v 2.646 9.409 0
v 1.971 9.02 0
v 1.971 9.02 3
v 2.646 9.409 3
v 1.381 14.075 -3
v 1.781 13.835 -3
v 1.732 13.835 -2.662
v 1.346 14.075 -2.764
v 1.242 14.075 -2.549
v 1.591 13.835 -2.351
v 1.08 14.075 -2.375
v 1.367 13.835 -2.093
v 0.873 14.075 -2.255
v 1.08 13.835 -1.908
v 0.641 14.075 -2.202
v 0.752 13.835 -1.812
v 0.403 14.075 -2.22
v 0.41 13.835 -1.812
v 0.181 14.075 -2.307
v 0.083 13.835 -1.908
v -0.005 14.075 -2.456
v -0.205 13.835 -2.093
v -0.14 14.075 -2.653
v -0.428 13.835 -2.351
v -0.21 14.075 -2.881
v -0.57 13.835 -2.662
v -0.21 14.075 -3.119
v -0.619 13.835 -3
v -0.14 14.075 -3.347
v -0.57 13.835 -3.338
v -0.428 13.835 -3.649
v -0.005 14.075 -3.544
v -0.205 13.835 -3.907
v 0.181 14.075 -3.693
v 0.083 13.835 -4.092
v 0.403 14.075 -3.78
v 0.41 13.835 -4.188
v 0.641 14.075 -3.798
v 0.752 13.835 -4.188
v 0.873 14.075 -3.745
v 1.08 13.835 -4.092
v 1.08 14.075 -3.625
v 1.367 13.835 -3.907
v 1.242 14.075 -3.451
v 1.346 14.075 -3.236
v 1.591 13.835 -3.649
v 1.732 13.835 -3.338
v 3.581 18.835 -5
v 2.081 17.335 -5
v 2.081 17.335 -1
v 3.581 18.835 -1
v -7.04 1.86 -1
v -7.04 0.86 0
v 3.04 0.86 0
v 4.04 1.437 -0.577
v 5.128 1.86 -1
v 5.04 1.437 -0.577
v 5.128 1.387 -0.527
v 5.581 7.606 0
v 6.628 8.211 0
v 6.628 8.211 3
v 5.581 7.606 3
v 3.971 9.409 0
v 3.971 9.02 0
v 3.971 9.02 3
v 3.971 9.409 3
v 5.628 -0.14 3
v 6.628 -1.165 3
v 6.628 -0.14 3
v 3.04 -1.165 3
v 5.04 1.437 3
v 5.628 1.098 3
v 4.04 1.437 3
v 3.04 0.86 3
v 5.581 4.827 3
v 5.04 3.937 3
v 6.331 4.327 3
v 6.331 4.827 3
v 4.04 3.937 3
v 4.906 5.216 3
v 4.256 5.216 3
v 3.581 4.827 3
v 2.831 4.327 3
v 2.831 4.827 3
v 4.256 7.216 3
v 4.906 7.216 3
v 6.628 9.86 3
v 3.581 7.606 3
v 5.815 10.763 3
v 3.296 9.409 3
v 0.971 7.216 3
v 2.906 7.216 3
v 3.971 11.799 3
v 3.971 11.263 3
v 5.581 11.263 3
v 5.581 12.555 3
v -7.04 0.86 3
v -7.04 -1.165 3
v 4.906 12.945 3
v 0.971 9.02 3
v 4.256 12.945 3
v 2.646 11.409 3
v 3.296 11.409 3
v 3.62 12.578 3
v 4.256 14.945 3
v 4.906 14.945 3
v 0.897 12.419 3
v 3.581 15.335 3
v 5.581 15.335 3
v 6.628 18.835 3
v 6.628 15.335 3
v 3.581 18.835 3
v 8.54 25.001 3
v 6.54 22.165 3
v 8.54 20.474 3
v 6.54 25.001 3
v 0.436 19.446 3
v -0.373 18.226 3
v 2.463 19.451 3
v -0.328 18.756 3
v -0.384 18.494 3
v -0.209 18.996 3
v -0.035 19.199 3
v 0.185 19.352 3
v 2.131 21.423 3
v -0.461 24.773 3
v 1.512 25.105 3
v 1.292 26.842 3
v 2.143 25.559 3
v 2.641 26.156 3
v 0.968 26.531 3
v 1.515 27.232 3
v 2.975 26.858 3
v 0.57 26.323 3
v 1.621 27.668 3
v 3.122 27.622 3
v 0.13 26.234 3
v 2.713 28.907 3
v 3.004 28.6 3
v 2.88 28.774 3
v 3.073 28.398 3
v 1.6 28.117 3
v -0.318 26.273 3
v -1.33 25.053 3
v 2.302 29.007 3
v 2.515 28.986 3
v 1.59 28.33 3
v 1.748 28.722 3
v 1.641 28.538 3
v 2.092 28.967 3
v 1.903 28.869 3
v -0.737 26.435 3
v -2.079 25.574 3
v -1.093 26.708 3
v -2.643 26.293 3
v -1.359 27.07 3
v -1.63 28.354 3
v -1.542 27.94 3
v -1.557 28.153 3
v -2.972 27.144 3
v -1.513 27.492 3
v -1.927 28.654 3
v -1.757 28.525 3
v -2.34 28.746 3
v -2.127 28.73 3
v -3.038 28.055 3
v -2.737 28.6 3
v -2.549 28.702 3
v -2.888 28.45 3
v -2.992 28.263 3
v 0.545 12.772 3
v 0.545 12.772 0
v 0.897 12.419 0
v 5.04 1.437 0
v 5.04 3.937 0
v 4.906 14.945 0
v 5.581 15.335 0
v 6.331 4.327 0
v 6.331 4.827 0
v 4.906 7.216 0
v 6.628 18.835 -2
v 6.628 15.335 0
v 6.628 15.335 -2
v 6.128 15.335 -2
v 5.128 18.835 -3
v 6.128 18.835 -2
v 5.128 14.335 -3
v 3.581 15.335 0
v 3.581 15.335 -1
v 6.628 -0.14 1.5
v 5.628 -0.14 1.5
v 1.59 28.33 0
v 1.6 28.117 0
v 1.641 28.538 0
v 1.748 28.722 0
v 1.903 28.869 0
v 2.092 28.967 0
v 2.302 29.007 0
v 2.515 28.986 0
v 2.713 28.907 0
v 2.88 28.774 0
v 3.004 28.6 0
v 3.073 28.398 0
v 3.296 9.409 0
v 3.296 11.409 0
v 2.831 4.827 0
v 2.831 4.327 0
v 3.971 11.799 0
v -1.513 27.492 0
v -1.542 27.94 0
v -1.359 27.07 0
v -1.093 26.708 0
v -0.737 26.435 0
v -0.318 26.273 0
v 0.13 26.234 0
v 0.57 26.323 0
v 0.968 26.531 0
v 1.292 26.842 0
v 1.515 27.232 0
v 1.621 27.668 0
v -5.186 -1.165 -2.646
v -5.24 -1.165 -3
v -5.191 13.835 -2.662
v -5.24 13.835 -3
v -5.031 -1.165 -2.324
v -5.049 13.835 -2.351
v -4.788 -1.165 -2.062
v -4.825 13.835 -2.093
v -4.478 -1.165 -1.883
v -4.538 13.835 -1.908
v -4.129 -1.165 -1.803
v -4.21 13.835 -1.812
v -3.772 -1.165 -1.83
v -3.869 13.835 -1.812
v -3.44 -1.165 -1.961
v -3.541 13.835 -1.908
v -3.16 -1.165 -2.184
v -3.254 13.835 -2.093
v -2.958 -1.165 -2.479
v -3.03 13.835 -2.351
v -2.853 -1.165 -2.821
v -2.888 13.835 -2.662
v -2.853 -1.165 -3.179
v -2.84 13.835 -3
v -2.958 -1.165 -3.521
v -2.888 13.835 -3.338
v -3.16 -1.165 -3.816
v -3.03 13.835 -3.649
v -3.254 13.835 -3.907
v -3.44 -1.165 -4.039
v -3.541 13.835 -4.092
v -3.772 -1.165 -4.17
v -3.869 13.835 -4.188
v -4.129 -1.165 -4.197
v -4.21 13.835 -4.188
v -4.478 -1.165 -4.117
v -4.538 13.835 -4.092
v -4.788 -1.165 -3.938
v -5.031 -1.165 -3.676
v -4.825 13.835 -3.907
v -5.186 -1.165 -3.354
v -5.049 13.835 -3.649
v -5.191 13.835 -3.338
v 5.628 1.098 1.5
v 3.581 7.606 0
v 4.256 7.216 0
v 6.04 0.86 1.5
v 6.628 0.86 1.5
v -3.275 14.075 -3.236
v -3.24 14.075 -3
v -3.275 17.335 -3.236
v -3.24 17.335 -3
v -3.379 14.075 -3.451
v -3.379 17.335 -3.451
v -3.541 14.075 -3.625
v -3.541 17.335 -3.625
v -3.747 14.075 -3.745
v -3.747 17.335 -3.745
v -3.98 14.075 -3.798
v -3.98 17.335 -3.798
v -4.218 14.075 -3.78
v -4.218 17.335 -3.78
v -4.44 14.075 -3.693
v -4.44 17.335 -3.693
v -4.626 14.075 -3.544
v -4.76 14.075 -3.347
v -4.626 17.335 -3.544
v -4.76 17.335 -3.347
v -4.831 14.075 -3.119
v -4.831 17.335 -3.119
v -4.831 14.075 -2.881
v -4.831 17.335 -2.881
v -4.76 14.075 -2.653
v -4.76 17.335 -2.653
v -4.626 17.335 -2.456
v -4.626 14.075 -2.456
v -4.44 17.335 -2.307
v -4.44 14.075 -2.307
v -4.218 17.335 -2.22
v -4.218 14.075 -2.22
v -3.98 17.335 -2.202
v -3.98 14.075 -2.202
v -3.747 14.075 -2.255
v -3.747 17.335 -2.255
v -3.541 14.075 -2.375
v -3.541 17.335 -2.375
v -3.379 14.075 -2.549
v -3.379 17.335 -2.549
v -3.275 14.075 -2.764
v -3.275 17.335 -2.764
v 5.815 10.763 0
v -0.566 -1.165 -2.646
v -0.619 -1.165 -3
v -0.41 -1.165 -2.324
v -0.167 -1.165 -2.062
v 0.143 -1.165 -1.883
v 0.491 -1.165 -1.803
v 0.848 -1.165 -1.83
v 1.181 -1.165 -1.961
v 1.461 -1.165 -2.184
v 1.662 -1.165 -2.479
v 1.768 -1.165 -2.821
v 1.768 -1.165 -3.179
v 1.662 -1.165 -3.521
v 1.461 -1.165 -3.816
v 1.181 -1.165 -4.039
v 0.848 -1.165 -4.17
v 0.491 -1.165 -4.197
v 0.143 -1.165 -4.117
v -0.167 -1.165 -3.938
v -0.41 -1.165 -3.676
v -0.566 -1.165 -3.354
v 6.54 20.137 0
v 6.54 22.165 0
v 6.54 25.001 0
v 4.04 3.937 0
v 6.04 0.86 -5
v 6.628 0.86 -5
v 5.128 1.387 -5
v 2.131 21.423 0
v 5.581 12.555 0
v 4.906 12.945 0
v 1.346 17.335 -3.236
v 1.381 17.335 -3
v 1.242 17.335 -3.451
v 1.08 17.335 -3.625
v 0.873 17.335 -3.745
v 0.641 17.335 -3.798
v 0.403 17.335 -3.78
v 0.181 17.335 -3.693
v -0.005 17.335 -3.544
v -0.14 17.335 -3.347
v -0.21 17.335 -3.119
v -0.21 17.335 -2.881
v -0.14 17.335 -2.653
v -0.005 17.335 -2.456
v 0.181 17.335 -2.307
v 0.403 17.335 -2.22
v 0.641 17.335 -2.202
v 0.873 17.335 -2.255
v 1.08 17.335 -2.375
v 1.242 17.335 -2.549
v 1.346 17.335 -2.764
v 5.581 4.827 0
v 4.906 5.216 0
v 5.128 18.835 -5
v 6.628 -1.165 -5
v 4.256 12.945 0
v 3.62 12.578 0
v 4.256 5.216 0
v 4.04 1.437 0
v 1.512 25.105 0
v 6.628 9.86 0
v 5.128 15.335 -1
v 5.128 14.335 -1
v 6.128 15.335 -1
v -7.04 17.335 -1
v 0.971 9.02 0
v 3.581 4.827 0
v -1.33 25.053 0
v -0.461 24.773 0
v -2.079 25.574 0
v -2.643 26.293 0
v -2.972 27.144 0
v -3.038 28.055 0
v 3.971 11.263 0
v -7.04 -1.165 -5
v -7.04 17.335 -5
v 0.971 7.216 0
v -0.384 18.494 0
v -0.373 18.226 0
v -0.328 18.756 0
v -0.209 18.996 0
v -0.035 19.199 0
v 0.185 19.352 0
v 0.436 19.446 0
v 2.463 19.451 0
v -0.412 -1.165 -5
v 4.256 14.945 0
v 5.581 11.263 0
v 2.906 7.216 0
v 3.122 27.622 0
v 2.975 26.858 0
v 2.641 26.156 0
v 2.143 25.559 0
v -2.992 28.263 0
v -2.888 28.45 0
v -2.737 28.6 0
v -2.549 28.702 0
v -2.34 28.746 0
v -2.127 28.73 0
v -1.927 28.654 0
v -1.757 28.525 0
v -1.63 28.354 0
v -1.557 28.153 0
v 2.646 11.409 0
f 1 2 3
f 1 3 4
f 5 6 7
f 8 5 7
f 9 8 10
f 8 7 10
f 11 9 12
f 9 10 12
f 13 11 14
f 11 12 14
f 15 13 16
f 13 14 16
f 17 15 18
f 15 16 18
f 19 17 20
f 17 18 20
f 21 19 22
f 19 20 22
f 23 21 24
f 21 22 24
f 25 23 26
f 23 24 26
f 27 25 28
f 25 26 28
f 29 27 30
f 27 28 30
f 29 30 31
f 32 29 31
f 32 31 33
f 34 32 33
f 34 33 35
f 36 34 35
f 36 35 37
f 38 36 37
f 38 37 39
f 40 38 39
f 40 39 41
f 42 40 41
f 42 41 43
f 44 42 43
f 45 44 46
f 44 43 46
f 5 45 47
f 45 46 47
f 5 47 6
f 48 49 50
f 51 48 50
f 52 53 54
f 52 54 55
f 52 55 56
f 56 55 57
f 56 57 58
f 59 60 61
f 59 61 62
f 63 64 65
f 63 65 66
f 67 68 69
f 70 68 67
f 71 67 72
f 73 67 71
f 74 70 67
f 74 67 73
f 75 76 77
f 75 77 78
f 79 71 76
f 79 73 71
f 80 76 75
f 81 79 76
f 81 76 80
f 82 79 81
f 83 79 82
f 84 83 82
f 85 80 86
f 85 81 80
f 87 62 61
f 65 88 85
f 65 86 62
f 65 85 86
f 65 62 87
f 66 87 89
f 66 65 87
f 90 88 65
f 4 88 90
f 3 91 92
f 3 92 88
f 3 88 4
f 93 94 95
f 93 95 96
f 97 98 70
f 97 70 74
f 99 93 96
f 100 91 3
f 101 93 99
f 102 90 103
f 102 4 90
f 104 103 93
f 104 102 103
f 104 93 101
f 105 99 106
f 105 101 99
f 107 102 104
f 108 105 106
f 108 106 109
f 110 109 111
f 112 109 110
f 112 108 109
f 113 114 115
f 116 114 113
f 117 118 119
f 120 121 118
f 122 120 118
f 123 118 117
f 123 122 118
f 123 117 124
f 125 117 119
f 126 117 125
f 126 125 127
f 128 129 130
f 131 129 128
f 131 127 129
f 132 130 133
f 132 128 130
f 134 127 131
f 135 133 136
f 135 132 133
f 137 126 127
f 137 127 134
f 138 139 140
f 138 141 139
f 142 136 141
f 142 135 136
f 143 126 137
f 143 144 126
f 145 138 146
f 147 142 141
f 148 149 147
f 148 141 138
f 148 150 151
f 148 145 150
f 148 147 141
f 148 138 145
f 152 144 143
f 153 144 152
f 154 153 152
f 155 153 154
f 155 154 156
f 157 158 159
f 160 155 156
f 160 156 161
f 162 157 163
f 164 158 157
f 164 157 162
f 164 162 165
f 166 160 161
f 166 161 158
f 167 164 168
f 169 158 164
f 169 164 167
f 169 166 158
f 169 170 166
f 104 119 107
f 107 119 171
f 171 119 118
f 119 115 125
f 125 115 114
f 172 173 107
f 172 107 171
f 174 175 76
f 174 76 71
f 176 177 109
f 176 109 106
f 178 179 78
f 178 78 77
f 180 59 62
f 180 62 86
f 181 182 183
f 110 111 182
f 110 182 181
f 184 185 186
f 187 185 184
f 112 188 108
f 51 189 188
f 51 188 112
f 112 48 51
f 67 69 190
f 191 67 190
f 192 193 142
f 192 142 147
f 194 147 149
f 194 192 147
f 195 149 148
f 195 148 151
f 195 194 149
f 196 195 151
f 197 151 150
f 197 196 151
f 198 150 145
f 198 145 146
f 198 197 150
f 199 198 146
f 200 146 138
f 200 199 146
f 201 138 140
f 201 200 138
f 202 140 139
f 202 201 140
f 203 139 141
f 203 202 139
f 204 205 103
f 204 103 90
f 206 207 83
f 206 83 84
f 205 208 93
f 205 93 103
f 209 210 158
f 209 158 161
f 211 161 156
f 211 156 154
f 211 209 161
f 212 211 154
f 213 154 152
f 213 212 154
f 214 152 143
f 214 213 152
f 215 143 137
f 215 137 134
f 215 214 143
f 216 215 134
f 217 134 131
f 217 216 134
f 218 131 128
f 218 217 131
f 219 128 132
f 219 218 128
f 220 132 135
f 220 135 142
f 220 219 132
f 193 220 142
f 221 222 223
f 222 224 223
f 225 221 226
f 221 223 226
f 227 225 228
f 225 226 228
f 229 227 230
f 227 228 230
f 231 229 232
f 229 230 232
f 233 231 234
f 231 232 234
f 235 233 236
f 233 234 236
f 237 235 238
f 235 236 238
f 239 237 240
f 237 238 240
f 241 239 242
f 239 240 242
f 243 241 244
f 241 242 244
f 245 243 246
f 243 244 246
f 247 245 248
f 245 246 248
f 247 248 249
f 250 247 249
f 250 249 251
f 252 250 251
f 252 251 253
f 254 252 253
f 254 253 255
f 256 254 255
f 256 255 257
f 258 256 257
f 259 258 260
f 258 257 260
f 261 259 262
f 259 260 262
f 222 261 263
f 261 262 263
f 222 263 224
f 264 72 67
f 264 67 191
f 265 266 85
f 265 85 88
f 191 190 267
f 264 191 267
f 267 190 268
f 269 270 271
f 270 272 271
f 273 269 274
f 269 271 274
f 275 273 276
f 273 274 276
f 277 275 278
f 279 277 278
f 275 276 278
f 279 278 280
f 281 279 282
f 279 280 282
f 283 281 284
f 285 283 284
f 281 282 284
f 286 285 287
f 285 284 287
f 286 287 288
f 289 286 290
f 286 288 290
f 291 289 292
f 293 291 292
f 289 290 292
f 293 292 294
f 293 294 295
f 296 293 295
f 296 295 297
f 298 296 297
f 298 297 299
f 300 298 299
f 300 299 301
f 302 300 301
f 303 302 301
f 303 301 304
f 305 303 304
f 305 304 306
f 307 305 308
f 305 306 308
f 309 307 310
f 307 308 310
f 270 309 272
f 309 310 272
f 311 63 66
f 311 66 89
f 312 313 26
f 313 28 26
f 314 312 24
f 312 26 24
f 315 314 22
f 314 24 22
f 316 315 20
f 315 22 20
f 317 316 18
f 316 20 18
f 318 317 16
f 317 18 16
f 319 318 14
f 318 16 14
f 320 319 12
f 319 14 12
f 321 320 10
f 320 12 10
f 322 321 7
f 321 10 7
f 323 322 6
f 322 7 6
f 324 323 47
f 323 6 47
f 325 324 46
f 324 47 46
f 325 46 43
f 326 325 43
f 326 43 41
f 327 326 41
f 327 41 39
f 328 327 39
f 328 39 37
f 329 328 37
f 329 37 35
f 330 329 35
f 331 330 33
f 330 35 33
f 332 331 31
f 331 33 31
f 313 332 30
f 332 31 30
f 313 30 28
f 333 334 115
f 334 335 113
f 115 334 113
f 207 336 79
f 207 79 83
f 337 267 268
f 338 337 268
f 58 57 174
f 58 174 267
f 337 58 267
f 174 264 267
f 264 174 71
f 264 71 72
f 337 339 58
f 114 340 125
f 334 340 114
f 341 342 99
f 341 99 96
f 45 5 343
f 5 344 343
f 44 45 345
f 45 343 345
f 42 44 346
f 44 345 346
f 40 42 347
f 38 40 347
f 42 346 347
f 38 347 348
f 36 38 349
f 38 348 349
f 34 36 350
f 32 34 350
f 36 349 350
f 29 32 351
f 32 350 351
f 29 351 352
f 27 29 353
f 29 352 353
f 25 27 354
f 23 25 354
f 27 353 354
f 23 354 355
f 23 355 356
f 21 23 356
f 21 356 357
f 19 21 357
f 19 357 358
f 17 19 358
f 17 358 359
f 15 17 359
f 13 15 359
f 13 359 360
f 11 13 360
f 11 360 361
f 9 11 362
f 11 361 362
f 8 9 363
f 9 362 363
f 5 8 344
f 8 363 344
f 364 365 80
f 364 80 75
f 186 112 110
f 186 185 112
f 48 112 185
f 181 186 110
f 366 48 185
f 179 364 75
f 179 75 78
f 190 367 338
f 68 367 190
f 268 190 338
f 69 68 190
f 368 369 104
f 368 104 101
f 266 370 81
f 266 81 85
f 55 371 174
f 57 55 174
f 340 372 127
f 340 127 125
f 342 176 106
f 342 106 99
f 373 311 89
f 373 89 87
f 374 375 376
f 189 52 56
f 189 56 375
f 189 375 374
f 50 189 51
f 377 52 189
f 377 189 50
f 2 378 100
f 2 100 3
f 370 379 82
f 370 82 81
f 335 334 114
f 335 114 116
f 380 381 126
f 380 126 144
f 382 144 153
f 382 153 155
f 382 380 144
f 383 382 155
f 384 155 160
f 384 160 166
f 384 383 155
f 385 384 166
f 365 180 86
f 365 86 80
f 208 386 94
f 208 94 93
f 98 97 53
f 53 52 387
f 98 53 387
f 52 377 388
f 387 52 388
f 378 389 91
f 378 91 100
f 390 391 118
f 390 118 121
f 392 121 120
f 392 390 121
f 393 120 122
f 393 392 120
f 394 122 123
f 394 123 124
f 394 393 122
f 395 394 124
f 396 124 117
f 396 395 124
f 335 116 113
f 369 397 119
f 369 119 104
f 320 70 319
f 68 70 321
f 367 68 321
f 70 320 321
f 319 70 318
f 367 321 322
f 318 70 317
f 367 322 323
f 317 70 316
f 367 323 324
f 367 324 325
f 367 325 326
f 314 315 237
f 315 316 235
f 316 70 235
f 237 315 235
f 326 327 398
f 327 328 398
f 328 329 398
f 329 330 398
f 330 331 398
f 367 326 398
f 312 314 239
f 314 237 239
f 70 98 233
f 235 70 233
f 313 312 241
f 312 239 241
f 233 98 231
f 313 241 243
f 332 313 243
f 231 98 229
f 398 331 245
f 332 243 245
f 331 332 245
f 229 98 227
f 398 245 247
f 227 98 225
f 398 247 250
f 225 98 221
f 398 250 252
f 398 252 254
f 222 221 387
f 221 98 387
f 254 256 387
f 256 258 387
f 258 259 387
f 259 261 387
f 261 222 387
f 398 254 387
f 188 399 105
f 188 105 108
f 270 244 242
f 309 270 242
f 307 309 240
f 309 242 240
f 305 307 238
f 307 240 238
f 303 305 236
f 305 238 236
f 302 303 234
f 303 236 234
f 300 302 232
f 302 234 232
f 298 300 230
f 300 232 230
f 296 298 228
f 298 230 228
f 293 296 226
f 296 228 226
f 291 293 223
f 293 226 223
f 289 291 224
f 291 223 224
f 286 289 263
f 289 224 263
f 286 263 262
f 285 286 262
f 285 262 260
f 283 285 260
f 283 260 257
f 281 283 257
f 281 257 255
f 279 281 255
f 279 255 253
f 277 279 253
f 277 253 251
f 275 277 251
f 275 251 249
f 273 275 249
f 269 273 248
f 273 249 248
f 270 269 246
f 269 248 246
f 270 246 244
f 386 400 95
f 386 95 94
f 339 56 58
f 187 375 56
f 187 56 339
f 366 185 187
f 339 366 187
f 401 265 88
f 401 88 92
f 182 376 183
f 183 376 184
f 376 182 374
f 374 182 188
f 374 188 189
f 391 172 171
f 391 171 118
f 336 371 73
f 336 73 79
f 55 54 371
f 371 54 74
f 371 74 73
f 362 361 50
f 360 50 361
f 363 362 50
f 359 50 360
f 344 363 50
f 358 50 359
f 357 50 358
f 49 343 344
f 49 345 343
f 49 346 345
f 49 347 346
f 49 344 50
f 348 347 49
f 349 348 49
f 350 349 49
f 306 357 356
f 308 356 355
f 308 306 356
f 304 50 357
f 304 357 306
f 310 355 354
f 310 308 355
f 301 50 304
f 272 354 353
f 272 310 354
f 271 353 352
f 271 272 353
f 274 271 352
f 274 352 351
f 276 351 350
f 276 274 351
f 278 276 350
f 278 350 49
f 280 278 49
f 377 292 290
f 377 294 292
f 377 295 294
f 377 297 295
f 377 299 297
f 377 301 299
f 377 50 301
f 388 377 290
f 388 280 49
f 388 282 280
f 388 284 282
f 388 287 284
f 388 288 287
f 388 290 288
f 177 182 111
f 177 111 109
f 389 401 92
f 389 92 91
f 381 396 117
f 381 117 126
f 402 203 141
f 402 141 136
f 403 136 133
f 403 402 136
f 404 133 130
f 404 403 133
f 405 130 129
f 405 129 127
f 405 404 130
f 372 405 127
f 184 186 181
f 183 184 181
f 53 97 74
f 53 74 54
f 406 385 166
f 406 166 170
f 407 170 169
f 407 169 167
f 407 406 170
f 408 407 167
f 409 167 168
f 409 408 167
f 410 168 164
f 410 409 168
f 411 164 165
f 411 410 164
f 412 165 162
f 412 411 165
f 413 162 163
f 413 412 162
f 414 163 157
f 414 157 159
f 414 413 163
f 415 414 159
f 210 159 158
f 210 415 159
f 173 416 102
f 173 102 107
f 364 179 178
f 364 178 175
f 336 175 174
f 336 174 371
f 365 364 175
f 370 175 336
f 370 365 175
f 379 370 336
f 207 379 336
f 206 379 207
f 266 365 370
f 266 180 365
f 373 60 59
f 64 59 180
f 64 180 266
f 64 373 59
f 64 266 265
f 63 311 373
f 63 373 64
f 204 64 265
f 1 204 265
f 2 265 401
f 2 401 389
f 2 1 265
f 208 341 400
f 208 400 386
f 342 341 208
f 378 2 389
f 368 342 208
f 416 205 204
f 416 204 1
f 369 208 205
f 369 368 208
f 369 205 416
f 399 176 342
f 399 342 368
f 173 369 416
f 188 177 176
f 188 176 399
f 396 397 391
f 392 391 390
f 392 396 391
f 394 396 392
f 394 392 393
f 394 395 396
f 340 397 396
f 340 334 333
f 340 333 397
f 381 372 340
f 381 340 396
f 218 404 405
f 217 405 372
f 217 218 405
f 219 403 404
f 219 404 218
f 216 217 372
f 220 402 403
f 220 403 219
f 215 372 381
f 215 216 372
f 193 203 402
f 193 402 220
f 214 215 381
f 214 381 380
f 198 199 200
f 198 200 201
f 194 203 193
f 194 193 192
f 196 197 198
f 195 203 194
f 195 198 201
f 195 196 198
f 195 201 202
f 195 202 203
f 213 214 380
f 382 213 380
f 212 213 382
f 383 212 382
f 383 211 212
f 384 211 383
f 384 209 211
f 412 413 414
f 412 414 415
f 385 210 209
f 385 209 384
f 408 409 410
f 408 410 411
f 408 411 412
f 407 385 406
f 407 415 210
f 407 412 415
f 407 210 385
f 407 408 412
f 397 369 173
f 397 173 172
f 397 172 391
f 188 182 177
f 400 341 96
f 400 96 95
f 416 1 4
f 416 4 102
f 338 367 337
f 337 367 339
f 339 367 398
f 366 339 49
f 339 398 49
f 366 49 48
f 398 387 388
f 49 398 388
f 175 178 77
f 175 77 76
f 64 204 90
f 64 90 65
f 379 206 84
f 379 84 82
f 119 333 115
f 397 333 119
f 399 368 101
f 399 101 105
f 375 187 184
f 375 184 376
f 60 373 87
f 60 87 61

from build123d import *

# Parameters (mm, degrees)
BOSS_SWITCHMAIN_DEPTH                          = 3
SKETCH1_W                                      = 4
SKETCH1_H                                      = 3.5
BOSS_FLANGE_WIDTH_DEPTH                        = 5
BOSS_FLANGE_HEIGHT_REACH                       = 38.958
SKETCH2_W                                      = 4
SKETCH2_H                                      = 2
SKETCH2_W_2                                    = 8
SKETCH2_H_2                                    = 2.024994097
CUT_UP_TO_DOWN_DERAILLEUR_CLEARANCE_REACH      = 27.678
SKETCH10_W                                     = 2.453096586
SKETCH10_H                                     = 3
SKETCH17_W                                     = 12.1675
SKETCH17_H                                     = 4
BOSS_FLANGE_SUPPORT_DEPTH                      = 14.475002167
TAP_DRILL_FOR_M2X0_4_TAP1_D                    = 1.6
M2_CLEARANCE_HOLE2_D                           = 2.4
M2_CLEARANCE_HOLE2_DEPTH                       = 15
M2_CLEARANCE_HOLE2_TIP                         = 0.721032743
CUT_UP_TO_DOWN_CANTILEVER_SLOPE_REACH          = 32.725
CUT_DOWN_TO_UP_DERAILLEUR_CLEARANCE_DEPTH      = 34.178566414
CUT_DOWN_TO_UP_DERAILLEUR_CLEARANCE_DEPTH_BACK = 34.178566414
CHAMFER_FLANGE_SUPPORT_SIZE                    = 1.5
CHAMFER_FLANGE_SUPPORT_2_SIZE                  = 1
CHAMFER_FLANGE_SUPPORT_3_SIZE                  = 1
SKETCH18_W                                     = 1.5
SKETCH18_H                                     = 1.577350269
CUT_DOWN_TO_UP_DERAILLEUR_CLEARANCE_2_DEPTH    = 1


with BuildPart() as part:
    # Sketch-SwitchBossUp → Boss-SwitchMain (new body)
    with BuildSketch(Plane.XY):
        with BuildLine():
            Line((6.540476927, 22.165014537), (6.540476927, 25.000549624))
            Line((6.540476927, 25.000549624), (8.540476927, 25.000549624))
            Line((8.540476927, 25.000549624), (8.540476927, 20.473554675))
            Line((8.540476927, 20.473554675), (2.463355023, 19.450530066))
            Line((2.463355023, 19.450530066), (3.620297651, 12.577888564))
            Line((3.620297651, 12.577888564), (4.256080915, 12.944958203))
            Line((4.256080915, 12.944958203), (4.256080915, 14.944958203))
            Line((4.256080915, 14.944958203), (3.581073513, 15.334673908))
            Line((3.581073513, 15.334673908), (3.581073513, 18.834673908))
            Line((3.581073513, 18.834673908), (6.857327822, 18.834673908))
            Line((6.857327822, 18.834673908), (15.309115797, 18.834673908))
            Line((15.309115797, 18.834673908), (15.309115797, -1.165326092))
            Line((15.309115797, -1.165326092), (5.040476927, -1.165326092))
            Line((5.040476927, -1.165326092), (3.040476927, -1.165326092))
            Line((3.040476927, -1.165326092), (3.040476927, 0.859668005))
            Line((3.040476927, 0.859668005), (4.040476927, 1.437018274))
            Line((4.040476927, 1.437018274), (4.040476927, 3.937018274))
            Line((4.040476927, 3.937018274), (2.83114552, 4.326720436))
            Line((2.83114552, 4.326720436), (2.83114552, 4.826720436))
            Line((2.83114552, 4.826720436), (3.58114552, 4.826720436))
            Line((3.58114552, 4.826720436), (4.256138119, 5.216427595))
            Line((4.256138119, 5.216427595), (4.256138119, 7.216427595))
            Line((4.256138119, 7.216427595), (3.581130717, 7.6061433))
            Line((3.581130717, 7.6061433), (2.9061262, 7.216422599))
            Line((2.9061262, 7.216422599), (0.971281627, 7.216422599))
            Line((0.971281627, 7.216422599), (0.971281627, 9.019692757))
            Line((0.971281627, 9.019692757), (1.971281627, 9.019692757))
            Line((1.971281627, 9.019692757), (2.646271341, 9.40939825))
            Line((2.646271341, 9.40939825), (2.646271341, 11.40939825))
            Line((2.646271341, 11.40939825), (0.897326855, 12.41915182))
            Line((0.897326855, 12.41915182), (0.545466745, 12.771663724))
            Line((0.545466745, 12.771663724), (-0.372784255, 18.226393961))
            ThreePointArc((-0.372784255, 18.226393961), (-0.209313172, 18.996084896), (0.435897335, 19.446473985))
            Line((0.435897335, 19.446473985), (-0.46073685, 24.772792819))
            ThreePointArc((-0.46073685, 24.772792819), (-2.387846783, 25.912534906), (-3.038018253, 28.054973186))
            ThreePointArc((-3.038018253, 28.054973186), (-2.23296648, 28.745546602), (-1.542393064, 27.940494829))
            ThreePointArc((-1.542393064, 27.940494829), (0.129544452, 26.234339128), (1.59980805, 28.11706781))
            ThreePointArc((1.59980805, 28.11706781), (2.195840434, 28.994419163), (3.073191787, 28.398386779))
            ThreePointArc((3.073191787, 28.398386779), (2.830256228, 26.496543155), (1.511513111, 25.104801997))
            Line((1.511513111, 25.104801997), (2.131345845, 21.422780026))
            Line((2.131345845, 21.422780026), (6.540476927, 22.165014537))
        make_face()
        Polygon((5.581091201, 12.555245643), (5.581100766, 11.263016278), (3.971265023, 11.263016278), (3.97126394, 11.79911022), (3.296271341, 11.409403061), (3.296271341, 9.409403061), (3.971278743, 9.019687356), (3.971278743, 9.409408058), (5.815189335, 10.763016278), (6.627976927, 9.860324206), (6.627976927, 8.210536506), (5.581127833, 7.606137899), (4.906138119, 7.216432406), (4.906138119, 5.216432406), (5.58114552, 4.826716701), (6.33114552, 4.826716701), (6.33114552, 4.326716701), (5.040476927, 3.937018274), (5.040476927, 1.437018274), (6.040476927, 0.859668005), (9.127976927, 0.859668005), (10.437466736, 2.169157813), (10.437466736, 14.025180364), (9.127976927, 15.334670172), (5.581073513, 15.334670172), (4.906080915, 14.944963014), (4.906080915, 12.944963014), align=None, mode=Mode.SUBTRACT)
    extrude(amount=BOSS_SWITCHMAIN_DEPTH)

    # Sketch1 → Boss-Flange Width (add)
    with BuildSketch(Plane(origin=(0, 0, 0), x_dir=(-1, 0, 0), z_dir=(0, 0, -1))):
        Polygon((-7.581073513, -1.165326092), (0.412170615, -1.165326092), (0.412170615, 0.859668005), (-3.040476927, 0.859668005), (-4.040476927, 1.437018274), (-5.040476927, 1.437018274), (-6.040476927, 0.859668005), (-7.581073513, 0.859668005), align=None)
        with Locations((-5.581073513, 17.084673908)):
            Rectangle(SKETCH1_W, SKETCH1_H)
    extrude(amount=BOSS_FLANGE_WIDTH_DEPTH)

    # Sketch2 → Boss-Flange Height (add, up to next)
    with BuildSketch(Plane(origin=(-7.039523073, 0, 0), x_dir=(0, 0, -1), z_dir=(1, 0, 0)), mode=Mode.PRIVATE) as boss_flange_height_sk1:
        with Locations((3, 16.334673908)):
            Rectangle(SKETCH2_W, SKETCH2_H)
    boss_flange_height_tool1 = extrude(boss_flange_height_sk1.sketch, amount=BOSS_FLANGE_HEIGHT_REACH, mode=Mode.PRIVATE) - part.part
    # Sketch2 → Boss-Flange Height (add, up to next)
    with BuildSketch(Plane(origin=(-7.039523073, 0, 0), x_dir=(0, 0, -1), z_dir=(1, 0, 0)), mode=Mode.PRIVATE) as boss_flange_height_sk2:
        with Locations((1, -0.152829044)):
            Rectangle(SKETCH2_W_2, SKETCH2_H_2)
    boss_flange_height_tool2 = extrude(boss_flange_height_sk2.sketch, amount=BOSS_FLANGE_HEIGHT_REACH, mode=Mode.PRIVATE) - part.part
    add(boss_flange_height_tool1.solids().sort_by_distance((-7.039523, 16.334674, -3))[0])
    add(boss_flange_height_tool2.solids().sort_by_distance((-7.039523, -0.152829, -1))[0])

    # Sketch10 → Cut-Up-To-Down Derailleur Clearance (cut, up to next)
    with BuildSketch(Plane(origin=(0, 18.834673908, 0), x_dir=(1, 0, 0), z_dir=(0, 1, 0)), mode=Mode.PRIVATE) as cut_up_to_down_derailleur_clearance_sk1:
        with Locations((6.35452522, 3.5)):
            Rectangle(SKETCH10_W, SKETCH10_H)
    cut_up_to_down_derailleur_clearance_tool1 = extrude(cut_up_to_down_derailleur_clearance_sk1.sketch, amount=-CUT_UP_TO_DOWN_DERAILLEUR_CLEARANCE_REACH, mode=Mode.PRIVATE) & part.part
    add(cut_up_to_down_derailleur_clearance_tool1.solids().sort_by_distance((6.354525, 18.834674, -3.5))[0], mode=Mode.SUBTRACT)


with BuildPart() as boss_flange_support_tool:
    # Sketch17 → Boss-Flange Support (new body)
    with BuildSketch(Plane.XZ.offset(-15.334670172)):
        with Locations((-0.955773073, -3)):
            Rectangle(SKETCH17_W, SKETCH17_H)
    extrude(amount=BOSS_FLANGE_SUPPORT_DEPTH)


with BuildPart() as part_1:
    add(part.part)


with BuildPart() as part_2:
    # Boss-Flange Support: joined with boss_flange_support_tool
    add(part_1.part.fuse(boss_flange_support_tool.part, tol=0.00001))

    # Tap Drill for M2x0.4 Tap1 (through all)
    with Locations(Plane(origin=(0, -1.165326092, 0), x_dir=(-1, 0, 0), z_dir=(0, -1, 0))):
        with Locations((4.039523073, 3), (-0.581073513, 3)):
            Hole(TAP_DRILL_FOR_M2X0_4_TAP1_D / 2)

    # M2 Clearance Hole2
    with Locations(Plane.XZ.offset(1.165326092)):
        with Locations((-4.039523073, -3), (0.581073513, -3)):
            Hole(M2_CLEARANCE_HOLE2_D / 2, depth=M2_CLEARANCE_HOLE2_DEPTH)
            with Locations((0, 0, -(M2_CLEARANCE_HOLE2_DEPTH + M2_CLEARANCE_HOLE2_TIP / 2))):  # 118° drill point
                Cone(0, M2_CLEARANCE_HOLE2_D / 2, M2_CLEARANCE_HOLE2_TIP, mode=Mode.SUBTRACT)

    # Sketch12 → Cut-Up-to-Down Cantilever Slope (cut, up to next)
    with BuildSketch(Plane(origin=(0, 25.000549624, 0), x_dir=(1, 0, 0), z_dir=(0, 1, 0)), mode=Mode.PRIVATE) as cut_up_to_down_cantilever_slope_sk1:
        Polygon((6.540476927, 0), (8.540476927, -3), (8.540476927, 0), align=None)
    cut_up_to_down_cantilever_slope_tool1 = extrude(cut_up_to_down_cantilever_slope_sk1.sketch, amount=-CUT_UP_TO_DOWN_CANTILEVER_SLOPE_REACH, mode=Mode.PRIVATE) & part_2.part
    add(cut_up_to_down_cantilever_slope_tool1.solids().sort_by_distance((7.87381, 25.00055, 1))[0], mode=Mode.SUBTRACT)

    # Sketch16 → Cut-Down-to-Up Derailleur Clearance (cut, two sides: drawn at the far end of the back side and taken through both)
    with BuildSketch(Plane(origin=(0, 0, 0), x_dir=(-1, 0, 0), z_dir=(0, 0, -1)).offset(-CUT_DOWN_TO_UP_DERAILLEUR_CLEARANCE_DEPTH_BACK)):
        Polygon((-6.627976927, 18.834673908), (-15.309115797, 18.834673908), (-15.309115797, -1.165326092), (-6.627976927, -1.165326092), (-6.627976927, 5.203794929), (-8.003689255, 5.203794929), (-8.003689255, 12.048417413), (-6.627976927, 12.048417413), align=None)
    extrude(amount=CUT_DOWN_TO_UP_DERAILLEUR_CLEARANCE_DEPTH + CUT_DOWN_TO_UP_DERAILLEUR_CLEARANCE_DEPTH_BACK, mode=Mode.SUBTRACT)

    # Chamfer-Flange Support
    chamfer_flange_support_edges = [part_2.edges().sort_by_distance(p)[0] for p in [
        (3.581073513, 17.334673908, -3),
    ]]
    chamfer(chamfer_flange_support_edges, length=CHAMFER_FLANGE_SUPPORT_SIZE - 0.0001)  # a hair under: the kernel refuses the full size

    # Chamfer-Flange Support 2
    chamfer_flange_support_2_edges = [part_2.edges().sort_by_distance(p)[0] for p in [
        (5.127976927, 17.084673908, -2),
        (5.127976927, 15.334670172, -1.5),
    ]]
    chamfer(chamfer_flange_support_2_edges, length=CHAMFER_FLANGE_SUPPORT_2_SIZE)

    # Chamfer-Flange Support 3
    chamfer_flange_support_3_edges = [part_2.edges().sort_by_distance(p)[0] for p in [
        (-1.999523073, 0.859668005, -1),
    ]]
    chamfer(chamfer_flange_support_3_edges, length=CHAMFER_FLANGE_SUPPORT_3_SIZE)

    # Sketch18 → Cut-Down-to-Up Derailleur Clearance 2 (cut)
    with BuildSketch(Plane(origin=(6.627976927, 0, 0), x_dir=(0, 0, -1), z_dir=(1, 0, 0))):
        with Locations((-2.25, 0.64834314)):
            Rectangle(SKETCH18_W, SKETCH18_H)
    extrude(amount=-CUT_DOWN_TO_UP_DERAILLEUR_CLEARANCE_2_DEPTH, mode=Mode.SUBTRACT)


solid = part_2.part
